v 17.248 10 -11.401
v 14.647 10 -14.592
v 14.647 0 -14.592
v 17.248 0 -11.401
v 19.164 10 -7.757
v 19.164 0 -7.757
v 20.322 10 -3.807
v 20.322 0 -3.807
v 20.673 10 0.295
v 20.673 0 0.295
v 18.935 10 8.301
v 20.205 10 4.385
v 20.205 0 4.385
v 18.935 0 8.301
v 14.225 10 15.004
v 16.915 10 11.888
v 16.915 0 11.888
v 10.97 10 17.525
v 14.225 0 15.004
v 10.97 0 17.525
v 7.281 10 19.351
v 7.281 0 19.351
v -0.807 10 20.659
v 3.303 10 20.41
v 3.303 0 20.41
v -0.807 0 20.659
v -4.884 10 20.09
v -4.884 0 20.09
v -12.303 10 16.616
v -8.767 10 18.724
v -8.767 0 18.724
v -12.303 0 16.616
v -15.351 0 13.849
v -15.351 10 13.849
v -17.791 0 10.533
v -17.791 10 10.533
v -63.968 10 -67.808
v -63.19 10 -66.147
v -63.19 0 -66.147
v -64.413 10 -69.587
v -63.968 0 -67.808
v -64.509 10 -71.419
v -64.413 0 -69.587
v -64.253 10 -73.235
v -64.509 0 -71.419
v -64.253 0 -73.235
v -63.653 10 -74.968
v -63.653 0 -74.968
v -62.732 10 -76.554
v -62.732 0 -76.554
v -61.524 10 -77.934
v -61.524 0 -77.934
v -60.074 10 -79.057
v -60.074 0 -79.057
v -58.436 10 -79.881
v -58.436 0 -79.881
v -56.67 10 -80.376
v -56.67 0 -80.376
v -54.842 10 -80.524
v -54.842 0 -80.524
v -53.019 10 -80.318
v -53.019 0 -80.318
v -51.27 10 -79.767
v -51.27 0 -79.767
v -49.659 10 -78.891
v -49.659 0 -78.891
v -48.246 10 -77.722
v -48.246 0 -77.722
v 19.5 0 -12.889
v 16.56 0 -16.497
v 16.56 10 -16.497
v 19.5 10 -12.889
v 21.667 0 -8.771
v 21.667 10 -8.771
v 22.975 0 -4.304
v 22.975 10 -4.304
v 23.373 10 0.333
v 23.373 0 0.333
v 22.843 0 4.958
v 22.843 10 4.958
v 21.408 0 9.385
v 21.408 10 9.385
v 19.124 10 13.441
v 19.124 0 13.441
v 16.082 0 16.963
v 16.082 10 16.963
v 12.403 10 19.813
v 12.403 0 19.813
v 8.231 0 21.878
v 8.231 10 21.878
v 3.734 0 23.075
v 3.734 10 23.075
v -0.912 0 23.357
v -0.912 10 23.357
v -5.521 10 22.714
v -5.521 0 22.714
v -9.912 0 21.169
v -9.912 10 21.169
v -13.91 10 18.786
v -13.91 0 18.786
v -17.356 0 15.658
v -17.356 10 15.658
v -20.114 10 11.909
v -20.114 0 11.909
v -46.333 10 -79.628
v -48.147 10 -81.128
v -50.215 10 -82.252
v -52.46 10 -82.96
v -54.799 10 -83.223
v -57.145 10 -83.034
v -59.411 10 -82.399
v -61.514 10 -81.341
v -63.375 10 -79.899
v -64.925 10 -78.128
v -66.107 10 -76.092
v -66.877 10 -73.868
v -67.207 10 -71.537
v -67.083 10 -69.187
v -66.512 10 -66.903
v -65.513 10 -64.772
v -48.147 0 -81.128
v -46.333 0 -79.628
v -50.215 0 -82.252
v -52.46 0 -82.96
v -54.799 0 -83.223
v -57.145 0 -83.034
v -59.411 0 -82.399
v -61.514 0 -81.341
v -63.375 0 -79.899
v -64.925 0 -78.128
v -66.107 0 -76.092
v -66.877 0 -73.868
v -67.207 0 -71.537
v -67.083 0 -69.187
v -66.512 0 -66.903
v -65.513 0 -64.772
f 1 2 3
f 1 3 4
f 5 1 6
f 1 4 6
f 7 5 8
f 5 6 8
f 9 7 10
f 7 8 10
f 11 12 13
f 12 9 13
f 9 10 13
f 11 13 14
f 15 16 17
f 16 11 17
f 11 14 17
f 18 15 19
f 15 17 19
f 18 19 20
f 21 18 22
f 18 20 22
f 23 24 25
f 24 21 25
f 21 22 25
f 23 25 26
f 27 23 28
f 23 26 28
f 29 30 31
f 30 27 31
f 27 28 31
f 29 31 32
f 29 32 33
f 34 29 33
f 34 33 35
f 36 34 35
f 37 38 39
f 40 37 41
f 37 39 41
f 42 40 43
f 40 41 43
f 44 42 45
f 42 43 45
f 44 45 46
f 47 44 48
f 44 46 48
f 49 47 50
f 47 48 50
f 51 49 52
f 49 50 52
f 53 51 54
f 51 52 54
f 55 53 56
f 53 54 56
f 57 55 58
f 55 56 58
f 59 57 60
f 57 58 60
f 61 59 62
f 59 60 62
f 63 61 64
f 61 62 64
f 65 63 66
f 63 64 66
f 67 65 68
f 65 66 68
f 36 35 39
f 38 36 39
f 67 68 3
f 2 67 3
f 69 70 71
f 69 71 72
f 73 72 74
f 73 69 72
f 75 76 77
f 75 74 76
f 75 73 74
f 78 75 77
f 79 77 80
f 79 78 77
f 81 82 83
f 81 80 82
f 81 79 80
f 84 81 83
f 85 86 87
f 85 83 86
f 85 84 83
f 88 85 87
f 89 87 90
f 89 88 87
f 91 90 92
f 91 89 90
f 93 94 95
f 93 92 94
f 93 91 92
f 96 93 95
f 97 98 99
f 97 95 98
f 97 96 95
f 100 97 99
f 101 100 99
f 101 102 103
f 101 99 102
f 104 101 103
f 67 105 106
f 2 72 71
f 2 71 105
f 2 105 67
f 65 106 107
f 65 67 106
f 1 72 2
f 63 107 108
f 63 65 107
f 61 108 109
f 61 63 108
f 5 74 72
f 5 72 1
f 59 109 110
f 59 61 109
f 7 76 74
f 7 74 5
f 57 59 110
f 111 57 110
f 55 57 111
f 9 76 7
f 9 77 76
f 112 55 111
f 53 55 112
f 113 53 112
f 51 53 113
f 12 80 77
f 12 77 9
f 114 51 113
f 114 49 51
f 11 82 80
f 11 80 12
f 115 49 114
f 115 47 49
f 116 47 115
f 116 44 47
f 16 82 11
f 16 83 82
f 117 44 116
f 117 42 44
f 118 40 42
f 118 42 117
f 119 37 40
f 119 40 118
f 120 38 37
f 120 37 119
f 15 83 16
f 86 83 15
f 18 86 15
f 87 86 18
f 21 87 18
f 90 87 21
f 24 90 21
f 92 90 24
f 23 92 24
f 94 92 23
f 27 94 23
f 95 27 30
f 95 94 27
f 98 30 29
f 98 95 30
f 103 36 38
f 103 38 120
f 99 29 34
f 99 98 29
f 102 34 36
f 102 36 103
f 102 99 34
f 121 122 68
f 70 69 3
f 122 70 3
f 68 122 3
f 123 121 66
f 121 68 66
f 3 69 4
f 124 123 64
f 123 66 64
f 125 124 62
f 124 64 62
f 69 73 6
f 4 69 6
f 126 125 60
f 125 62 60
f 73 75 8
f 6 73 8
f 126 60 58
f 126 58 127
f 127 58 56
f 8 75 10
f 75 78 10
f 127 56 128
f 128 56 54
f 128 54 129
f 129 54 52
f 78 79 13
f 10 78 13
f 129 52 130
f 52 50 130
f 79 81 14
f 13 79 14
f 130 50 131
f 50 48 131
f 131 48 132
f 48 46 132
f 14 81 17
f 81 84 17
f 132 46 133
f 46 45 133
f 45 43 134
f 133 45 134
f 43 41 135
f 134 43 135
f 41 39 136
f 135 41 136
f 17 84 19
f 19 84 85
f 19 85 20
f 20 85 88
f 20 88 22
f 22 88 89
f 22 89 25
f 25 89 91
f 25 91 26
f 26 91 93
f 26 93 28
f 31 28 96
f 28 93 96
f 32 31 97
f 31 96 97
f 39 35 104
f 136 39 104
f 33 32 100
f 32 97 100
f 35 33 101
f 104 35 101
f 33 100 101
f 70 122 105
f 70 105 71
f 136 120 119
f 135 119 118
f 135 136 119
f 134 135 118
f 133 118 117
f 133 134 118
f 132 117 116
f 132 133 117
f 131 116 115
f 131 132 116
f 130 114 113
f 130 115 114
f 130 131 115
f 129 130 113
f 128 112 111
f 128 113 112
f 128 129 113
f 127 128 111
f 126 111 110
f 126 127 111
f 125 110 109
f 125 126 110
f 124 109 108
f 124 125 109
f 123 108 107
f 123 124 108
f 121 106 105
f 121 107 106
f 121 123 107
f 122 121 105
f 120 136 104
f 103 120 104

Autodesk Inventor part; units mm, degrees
ref_plane "YZ Plane" through (0, 0, 0) normal (1, 0, 0) x (0, 1, 0)
ref_plane "XZ Plane" through (0, 0, 0) normal (0, 1, 0) x (-1, 0, 0)
ref_plane "XY Plane" through (0, 0, 0) normal (0, 0, 1) x (1, 0, 0)
sketch "Szkic1" plane through (0, 0, 0) normal (0, 1, 0) x (-1, 0, 0)
  arc A0 (48.2455, -77.7225) -> (63.1896, -66.1474) centre (54.9934, -71) ccw
  arc A1 (46.3327, -79.628) -> (65.5129, -64.7719) centre (54.9934, -71) ccw
  arc A2 (17.7907, 10.5331) -> (-14.647, -14.5918) centre (0, 0) ccw
  arc A3 (20.1141, 11.9086) -> (-16.5598, -16.4974) centre (0, 0) ccw
  line L0 (65.5129, -64.7719) -> (20.1141, 11.9086)
  line L1 (46.3327, -79.628) -> (-16.5598, -16.4974)
  line L2 (17.7907, 10.5331) -> (63.1896, -66.1474)
  line L3 (48.2455, -77.7225) -> (-14.647, -14.5918)
  point P0 (0, 0)
extrude "Wyciągnięcie proste1" add sketch "Szkic1" along normal blind 10
properties part number "Pas zębaty 10 T5-295"
